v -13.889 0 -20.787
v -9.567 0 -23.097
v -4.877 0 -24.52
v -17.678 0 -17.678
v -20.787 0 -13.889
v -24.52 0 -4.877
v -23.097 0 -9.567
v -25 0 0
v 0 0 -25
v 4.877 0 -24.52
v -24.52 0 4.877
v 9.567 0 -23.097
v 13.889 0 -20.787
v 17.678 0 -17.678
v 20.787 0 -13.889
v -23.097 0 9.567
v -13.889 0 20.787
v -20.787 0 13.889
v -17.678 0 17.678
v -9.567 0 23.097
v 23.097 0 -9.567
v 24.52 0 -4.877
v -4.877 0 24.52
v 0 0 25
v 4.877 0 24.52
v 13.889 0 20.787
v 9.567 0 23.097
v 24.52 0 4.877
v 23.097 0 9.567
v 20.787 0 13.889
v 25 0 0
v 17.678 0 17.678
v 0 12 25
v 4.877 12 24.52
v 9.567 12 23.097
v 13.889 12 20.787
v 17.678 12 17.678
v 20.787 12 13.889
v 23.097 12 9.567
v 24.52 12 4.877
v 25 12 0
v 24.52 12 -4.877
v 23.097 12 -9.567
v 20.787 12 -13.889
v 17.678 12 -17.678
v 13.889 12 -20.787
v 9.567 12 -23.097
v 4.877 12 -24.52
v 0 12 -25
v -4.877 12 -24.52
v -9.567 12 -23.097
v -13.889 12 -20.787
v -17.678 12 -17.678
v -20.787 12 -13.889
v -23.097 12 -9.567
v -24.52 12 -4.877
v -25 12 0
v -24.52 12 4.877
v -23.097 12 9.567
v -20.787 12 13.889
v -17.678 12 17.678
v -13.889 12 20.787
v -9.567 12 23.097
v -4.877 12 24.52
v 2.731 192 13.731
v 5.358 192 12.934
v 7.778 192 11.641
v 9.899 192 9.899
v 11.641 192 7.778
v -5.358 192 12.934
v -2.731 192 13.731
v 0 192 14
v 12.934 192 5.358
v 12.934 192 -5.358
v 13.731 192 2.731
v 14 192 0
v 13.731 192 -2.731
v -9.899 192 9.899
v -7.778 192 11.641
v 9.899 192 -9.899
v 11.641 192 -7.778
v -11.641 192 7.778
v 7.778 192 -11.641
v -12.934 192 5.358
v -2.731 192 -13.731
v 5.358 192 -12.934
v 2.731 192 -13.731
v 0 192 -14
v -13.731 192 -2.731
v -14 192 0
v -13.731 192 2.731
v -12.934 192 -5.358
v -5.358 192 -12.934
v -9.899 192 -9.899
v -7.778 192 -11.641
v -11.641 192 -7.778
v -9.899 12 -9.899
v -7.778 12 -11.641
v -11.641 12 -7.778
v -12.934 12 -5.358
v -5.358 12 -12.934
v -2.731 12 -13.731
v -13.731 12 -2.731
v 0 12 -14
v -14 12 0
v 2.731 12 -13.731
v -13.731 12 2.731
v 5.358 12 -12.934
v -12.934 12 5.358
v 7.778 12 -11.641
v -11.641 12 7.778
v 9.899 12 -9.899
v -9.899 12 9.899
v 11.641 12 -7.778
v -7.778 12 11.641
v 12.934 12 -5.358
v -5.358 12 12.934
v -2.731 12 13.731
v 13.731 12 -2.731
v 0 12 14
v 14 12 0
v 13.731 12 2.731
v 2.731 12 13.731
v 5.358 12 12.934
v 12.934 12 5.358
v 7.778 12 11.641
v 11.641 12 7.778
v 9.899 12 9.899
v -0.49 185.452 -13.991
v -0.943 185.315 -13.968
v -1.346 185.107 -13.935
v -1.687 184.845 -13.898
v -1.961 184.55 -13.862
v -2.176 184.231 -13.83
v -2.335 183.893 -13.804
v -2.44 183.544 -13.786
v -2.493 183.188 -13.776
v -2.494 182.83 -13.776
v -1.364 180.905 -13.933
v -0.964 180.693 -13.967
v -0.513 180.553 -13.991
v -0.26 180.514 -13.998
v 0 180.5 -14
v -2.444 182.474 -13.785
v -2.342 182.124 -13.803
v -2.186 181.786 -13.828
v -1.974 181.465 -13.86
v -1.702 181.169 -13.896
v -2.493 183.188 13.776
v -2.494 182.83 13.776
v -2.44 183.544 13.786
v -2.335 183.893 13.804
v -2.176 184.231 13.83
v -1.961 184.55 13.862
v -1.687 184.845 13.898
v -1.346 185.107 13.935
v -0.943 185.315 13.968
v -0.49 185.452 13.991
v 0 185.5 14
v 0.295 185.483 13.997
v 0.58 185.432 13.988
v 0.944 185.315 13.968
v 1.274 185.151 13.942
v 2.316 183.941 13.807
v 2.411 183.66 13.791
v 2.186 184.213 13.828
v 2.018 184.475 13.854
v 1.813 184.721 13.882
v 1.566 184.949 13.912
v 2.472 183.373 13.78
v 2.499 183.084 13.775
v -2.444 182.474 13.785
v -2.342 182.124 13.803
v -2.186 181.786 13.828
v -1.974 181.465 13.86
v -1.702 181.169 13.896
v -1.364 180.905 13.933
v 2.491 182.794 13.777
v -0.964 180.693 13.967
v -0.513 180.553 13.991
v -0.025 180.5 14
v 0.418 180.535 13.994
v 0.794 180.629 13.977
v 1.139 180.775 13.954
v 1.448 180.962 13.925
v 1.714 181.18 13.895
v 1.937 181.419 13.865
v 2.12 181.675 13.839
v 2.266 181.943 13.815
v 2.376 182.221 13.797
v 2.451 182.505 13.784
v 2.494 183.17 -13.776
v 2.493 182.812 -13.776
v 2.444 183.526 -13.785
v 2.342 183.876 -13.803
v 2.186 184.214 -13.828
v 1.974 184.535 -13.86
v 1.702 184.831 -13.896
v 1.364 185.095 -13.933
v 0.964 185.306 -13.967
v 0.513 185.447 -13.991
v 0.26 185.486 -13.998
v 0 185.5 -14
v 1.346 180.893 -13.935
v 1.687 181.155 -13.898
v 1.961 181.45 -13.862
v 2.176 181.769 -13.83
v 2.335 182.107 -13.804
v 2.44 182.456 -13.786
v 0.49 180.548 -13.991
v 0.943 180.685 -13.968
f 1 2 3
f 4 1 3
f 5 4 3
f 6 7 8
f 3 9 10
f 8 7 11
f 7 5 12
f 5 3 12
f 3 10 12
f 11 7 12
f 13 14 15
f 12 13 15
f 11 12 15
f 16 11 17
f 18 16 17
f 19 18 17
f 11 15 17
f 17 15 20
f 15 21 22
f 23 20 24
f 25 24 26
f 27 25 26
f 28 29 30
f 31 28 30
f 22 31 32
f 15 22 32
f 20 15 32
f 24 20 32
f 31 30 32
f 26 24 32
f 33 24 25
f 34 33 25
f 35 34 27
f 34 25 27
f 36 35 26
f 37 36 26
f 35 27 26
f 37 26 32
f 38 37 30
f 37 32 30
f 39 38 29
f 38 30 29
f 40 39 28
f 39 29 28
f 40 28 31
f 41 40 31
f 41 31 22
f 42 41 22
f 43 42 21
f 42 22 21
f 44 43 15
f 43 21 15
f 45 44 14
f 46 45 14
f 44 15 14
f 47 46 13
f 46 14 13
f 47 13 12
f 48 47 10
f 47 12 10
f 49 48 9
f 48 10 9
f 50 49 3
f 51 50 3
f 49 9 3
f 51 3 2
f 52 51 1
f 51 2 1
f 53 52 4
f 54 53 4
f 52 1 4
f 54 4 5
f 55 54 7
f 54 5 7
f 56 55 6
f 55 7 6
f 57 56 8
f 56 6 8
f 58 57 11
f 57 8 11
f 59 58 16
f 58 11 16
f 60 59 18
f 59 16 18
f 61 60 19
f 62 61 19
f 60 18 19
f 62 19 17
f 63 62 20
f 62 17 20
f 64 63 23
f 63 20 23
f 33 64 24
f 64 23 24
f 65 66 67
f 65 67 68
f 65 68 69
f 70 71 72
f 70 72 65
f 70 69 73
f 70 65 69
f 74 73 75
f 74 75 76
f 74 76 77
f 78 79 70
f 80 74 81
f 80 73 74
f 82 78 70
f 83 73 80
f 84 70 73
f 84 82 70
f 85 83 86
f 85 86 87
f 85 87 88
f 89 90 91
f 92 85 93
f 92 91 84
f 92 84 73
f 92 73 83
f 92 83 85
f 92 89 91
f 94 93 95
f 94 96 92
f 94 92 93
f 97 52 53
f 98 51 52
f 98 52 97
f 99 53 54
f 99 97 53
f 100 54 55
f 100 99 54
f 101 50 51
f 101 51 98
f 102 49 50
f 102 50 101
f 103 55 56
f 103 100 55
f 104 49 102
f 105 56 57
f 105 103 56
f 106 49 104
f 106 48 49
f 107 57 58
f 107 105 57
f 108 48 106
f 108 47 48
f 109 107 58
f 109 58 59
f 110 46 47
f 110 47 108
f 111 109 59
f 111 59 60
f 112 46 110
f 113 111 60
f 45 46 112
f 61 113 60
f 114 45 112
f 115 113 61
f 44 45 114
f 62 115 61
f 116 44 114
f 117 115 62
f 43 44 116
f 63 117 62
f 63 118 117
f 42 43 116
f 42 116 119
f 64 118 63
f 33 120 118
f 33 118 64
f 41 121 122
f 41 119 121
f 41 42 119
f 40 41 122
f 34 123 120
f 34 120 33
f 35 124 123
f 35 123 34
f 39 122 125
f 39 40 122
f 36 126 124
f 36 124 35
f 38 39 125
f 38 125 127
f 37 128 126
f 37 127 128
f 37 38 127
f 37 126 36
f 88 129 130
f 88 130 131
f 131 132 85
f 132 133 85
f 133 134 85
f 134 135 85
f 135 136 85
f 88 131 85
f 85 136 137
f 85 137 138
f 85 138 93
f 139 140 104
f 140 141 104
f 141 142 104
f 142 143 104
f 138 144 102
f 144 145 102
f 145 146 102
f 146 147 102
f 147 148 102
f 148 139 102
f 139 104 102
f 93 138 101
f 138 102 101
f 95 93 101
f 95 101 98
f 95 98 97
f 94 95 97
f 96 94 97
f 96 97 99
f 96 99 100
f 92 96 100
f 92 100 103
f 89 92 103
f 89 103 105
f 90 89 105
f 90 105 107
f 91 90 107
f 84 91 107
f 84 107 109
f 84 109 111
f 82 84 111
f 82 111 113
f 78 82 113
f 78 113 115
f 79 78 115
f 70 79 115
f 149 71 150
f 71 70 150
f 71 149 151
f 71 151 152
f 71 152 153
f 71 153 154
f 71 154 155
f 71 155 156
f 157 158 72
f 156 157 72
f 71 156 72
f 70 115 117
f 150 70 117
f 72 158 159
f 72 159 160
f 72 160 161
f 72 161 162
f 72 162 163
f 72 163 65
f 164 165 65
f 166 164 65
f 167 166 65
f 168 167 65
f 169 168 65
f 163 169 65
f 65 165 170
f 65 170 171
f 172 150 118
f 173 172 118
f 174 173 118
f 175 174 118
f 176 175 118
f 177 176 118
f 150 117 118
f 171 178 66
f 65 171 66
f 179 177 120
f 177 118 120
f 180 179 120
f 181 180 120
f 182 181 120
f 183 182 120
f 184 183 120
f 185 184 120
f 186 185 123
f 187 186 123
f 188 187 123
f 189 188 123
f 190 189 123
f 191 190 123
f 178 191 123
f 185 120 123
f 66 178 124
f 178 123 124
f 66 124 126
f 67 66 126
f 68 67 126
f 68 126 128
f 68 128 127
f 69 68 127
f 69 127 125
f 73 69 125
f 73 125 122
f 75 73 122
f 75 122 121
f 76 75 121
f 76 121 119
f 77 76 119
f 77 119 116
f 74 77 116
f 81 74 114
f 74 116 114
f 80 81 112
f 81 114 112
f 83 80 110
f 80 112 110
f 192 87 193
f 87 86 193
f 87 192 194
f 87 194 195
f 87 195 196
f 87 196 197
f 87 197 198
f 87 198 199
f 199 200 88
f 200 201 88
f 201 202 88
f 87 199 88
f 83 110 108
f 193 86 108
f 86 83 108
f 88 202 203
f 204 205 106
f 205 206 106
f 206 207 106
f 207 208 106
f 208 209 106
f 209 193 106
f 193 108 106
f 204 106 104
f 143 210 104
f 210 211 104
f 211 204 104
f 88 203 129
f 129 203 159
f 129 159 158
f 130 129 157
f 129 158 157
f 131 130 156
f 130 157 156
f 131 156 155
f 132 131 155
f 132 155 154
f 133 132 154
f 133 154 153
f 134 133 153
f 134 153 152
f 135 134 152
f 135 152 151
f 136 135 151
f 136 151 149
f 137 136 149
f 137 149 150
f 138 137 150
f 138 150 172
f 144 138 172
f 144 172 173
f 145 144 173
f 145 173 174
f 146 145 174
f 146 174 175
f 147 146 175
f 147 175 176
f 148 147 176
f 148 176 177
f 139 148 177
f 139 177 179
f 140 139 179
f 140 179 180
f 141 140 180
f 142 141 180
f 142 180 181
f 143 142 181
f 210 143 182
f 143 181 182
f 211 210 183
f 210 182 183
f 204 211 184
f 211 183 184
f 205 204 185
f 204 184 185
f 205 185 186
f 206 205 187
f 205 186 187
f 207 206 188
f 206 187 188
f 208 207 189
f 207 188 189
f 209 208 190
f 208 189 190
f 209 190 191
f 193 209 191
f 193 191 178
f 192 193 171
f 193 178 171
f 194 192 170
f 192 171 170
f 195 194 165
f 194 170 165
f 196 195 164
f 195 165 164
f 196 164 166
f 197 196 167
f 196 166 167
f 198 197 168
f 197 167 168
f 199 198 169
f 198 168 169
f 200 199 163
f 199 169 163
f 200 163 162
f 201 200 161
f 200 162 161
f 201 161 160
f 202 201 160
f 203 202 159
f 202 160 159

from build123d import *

# Parameters (mm, degrees)
SKETCH1_R           = 25
BOSS_EXTRUDE1_DEPTH = 12
SKETCH2_R           = 14
BOSS_EXTRUDE2_DEPTH = 180
SKETCH3_R           = 2.5
CUT_EXTRUDE1_DEPTH  = 90


with BuildPart() as part:
    # Sketch1 → Boss-Extrude1 (new body)
    with BuildSketch(Plane(origin=(0, 0, 0), x_dir=(1, 0, 0), z_dir=(0, 1, 0))):
        with Locations(Location((0, 0, 0), (0, 0, 270))):
            Circle(SKETCH1_R)
    extrude(amount=BOSS_EXTRUDE1_DEPTH)

    # Sketch2 → Boss-Extrude2 (add)
    with BuildSketch(Plane(origin=(0, 12, 0), x_dir=(1, 0, 0), z_dir=(0, 1, 0))):
        with Locations(Location((0, 0, 0), (0, 0, 90))):
            Circle(SKETCH2_R)
    extrude(amount=BOSS_EXTRUDE2_DEPTH)

    # Sketch3 → Cut-Extrude1 (cut, symmetric)
    with BuildSketch(Plane.XY):
        with Locations(Location((0, 183, 0), (0, 0, 90.000000007))):
            Circle(SKETCH3_R)
    extrude(amount=CUT_EXTRUDE1_DEPTH, both=True, mode=Mode.SUBTRACT)


solid = part.part
